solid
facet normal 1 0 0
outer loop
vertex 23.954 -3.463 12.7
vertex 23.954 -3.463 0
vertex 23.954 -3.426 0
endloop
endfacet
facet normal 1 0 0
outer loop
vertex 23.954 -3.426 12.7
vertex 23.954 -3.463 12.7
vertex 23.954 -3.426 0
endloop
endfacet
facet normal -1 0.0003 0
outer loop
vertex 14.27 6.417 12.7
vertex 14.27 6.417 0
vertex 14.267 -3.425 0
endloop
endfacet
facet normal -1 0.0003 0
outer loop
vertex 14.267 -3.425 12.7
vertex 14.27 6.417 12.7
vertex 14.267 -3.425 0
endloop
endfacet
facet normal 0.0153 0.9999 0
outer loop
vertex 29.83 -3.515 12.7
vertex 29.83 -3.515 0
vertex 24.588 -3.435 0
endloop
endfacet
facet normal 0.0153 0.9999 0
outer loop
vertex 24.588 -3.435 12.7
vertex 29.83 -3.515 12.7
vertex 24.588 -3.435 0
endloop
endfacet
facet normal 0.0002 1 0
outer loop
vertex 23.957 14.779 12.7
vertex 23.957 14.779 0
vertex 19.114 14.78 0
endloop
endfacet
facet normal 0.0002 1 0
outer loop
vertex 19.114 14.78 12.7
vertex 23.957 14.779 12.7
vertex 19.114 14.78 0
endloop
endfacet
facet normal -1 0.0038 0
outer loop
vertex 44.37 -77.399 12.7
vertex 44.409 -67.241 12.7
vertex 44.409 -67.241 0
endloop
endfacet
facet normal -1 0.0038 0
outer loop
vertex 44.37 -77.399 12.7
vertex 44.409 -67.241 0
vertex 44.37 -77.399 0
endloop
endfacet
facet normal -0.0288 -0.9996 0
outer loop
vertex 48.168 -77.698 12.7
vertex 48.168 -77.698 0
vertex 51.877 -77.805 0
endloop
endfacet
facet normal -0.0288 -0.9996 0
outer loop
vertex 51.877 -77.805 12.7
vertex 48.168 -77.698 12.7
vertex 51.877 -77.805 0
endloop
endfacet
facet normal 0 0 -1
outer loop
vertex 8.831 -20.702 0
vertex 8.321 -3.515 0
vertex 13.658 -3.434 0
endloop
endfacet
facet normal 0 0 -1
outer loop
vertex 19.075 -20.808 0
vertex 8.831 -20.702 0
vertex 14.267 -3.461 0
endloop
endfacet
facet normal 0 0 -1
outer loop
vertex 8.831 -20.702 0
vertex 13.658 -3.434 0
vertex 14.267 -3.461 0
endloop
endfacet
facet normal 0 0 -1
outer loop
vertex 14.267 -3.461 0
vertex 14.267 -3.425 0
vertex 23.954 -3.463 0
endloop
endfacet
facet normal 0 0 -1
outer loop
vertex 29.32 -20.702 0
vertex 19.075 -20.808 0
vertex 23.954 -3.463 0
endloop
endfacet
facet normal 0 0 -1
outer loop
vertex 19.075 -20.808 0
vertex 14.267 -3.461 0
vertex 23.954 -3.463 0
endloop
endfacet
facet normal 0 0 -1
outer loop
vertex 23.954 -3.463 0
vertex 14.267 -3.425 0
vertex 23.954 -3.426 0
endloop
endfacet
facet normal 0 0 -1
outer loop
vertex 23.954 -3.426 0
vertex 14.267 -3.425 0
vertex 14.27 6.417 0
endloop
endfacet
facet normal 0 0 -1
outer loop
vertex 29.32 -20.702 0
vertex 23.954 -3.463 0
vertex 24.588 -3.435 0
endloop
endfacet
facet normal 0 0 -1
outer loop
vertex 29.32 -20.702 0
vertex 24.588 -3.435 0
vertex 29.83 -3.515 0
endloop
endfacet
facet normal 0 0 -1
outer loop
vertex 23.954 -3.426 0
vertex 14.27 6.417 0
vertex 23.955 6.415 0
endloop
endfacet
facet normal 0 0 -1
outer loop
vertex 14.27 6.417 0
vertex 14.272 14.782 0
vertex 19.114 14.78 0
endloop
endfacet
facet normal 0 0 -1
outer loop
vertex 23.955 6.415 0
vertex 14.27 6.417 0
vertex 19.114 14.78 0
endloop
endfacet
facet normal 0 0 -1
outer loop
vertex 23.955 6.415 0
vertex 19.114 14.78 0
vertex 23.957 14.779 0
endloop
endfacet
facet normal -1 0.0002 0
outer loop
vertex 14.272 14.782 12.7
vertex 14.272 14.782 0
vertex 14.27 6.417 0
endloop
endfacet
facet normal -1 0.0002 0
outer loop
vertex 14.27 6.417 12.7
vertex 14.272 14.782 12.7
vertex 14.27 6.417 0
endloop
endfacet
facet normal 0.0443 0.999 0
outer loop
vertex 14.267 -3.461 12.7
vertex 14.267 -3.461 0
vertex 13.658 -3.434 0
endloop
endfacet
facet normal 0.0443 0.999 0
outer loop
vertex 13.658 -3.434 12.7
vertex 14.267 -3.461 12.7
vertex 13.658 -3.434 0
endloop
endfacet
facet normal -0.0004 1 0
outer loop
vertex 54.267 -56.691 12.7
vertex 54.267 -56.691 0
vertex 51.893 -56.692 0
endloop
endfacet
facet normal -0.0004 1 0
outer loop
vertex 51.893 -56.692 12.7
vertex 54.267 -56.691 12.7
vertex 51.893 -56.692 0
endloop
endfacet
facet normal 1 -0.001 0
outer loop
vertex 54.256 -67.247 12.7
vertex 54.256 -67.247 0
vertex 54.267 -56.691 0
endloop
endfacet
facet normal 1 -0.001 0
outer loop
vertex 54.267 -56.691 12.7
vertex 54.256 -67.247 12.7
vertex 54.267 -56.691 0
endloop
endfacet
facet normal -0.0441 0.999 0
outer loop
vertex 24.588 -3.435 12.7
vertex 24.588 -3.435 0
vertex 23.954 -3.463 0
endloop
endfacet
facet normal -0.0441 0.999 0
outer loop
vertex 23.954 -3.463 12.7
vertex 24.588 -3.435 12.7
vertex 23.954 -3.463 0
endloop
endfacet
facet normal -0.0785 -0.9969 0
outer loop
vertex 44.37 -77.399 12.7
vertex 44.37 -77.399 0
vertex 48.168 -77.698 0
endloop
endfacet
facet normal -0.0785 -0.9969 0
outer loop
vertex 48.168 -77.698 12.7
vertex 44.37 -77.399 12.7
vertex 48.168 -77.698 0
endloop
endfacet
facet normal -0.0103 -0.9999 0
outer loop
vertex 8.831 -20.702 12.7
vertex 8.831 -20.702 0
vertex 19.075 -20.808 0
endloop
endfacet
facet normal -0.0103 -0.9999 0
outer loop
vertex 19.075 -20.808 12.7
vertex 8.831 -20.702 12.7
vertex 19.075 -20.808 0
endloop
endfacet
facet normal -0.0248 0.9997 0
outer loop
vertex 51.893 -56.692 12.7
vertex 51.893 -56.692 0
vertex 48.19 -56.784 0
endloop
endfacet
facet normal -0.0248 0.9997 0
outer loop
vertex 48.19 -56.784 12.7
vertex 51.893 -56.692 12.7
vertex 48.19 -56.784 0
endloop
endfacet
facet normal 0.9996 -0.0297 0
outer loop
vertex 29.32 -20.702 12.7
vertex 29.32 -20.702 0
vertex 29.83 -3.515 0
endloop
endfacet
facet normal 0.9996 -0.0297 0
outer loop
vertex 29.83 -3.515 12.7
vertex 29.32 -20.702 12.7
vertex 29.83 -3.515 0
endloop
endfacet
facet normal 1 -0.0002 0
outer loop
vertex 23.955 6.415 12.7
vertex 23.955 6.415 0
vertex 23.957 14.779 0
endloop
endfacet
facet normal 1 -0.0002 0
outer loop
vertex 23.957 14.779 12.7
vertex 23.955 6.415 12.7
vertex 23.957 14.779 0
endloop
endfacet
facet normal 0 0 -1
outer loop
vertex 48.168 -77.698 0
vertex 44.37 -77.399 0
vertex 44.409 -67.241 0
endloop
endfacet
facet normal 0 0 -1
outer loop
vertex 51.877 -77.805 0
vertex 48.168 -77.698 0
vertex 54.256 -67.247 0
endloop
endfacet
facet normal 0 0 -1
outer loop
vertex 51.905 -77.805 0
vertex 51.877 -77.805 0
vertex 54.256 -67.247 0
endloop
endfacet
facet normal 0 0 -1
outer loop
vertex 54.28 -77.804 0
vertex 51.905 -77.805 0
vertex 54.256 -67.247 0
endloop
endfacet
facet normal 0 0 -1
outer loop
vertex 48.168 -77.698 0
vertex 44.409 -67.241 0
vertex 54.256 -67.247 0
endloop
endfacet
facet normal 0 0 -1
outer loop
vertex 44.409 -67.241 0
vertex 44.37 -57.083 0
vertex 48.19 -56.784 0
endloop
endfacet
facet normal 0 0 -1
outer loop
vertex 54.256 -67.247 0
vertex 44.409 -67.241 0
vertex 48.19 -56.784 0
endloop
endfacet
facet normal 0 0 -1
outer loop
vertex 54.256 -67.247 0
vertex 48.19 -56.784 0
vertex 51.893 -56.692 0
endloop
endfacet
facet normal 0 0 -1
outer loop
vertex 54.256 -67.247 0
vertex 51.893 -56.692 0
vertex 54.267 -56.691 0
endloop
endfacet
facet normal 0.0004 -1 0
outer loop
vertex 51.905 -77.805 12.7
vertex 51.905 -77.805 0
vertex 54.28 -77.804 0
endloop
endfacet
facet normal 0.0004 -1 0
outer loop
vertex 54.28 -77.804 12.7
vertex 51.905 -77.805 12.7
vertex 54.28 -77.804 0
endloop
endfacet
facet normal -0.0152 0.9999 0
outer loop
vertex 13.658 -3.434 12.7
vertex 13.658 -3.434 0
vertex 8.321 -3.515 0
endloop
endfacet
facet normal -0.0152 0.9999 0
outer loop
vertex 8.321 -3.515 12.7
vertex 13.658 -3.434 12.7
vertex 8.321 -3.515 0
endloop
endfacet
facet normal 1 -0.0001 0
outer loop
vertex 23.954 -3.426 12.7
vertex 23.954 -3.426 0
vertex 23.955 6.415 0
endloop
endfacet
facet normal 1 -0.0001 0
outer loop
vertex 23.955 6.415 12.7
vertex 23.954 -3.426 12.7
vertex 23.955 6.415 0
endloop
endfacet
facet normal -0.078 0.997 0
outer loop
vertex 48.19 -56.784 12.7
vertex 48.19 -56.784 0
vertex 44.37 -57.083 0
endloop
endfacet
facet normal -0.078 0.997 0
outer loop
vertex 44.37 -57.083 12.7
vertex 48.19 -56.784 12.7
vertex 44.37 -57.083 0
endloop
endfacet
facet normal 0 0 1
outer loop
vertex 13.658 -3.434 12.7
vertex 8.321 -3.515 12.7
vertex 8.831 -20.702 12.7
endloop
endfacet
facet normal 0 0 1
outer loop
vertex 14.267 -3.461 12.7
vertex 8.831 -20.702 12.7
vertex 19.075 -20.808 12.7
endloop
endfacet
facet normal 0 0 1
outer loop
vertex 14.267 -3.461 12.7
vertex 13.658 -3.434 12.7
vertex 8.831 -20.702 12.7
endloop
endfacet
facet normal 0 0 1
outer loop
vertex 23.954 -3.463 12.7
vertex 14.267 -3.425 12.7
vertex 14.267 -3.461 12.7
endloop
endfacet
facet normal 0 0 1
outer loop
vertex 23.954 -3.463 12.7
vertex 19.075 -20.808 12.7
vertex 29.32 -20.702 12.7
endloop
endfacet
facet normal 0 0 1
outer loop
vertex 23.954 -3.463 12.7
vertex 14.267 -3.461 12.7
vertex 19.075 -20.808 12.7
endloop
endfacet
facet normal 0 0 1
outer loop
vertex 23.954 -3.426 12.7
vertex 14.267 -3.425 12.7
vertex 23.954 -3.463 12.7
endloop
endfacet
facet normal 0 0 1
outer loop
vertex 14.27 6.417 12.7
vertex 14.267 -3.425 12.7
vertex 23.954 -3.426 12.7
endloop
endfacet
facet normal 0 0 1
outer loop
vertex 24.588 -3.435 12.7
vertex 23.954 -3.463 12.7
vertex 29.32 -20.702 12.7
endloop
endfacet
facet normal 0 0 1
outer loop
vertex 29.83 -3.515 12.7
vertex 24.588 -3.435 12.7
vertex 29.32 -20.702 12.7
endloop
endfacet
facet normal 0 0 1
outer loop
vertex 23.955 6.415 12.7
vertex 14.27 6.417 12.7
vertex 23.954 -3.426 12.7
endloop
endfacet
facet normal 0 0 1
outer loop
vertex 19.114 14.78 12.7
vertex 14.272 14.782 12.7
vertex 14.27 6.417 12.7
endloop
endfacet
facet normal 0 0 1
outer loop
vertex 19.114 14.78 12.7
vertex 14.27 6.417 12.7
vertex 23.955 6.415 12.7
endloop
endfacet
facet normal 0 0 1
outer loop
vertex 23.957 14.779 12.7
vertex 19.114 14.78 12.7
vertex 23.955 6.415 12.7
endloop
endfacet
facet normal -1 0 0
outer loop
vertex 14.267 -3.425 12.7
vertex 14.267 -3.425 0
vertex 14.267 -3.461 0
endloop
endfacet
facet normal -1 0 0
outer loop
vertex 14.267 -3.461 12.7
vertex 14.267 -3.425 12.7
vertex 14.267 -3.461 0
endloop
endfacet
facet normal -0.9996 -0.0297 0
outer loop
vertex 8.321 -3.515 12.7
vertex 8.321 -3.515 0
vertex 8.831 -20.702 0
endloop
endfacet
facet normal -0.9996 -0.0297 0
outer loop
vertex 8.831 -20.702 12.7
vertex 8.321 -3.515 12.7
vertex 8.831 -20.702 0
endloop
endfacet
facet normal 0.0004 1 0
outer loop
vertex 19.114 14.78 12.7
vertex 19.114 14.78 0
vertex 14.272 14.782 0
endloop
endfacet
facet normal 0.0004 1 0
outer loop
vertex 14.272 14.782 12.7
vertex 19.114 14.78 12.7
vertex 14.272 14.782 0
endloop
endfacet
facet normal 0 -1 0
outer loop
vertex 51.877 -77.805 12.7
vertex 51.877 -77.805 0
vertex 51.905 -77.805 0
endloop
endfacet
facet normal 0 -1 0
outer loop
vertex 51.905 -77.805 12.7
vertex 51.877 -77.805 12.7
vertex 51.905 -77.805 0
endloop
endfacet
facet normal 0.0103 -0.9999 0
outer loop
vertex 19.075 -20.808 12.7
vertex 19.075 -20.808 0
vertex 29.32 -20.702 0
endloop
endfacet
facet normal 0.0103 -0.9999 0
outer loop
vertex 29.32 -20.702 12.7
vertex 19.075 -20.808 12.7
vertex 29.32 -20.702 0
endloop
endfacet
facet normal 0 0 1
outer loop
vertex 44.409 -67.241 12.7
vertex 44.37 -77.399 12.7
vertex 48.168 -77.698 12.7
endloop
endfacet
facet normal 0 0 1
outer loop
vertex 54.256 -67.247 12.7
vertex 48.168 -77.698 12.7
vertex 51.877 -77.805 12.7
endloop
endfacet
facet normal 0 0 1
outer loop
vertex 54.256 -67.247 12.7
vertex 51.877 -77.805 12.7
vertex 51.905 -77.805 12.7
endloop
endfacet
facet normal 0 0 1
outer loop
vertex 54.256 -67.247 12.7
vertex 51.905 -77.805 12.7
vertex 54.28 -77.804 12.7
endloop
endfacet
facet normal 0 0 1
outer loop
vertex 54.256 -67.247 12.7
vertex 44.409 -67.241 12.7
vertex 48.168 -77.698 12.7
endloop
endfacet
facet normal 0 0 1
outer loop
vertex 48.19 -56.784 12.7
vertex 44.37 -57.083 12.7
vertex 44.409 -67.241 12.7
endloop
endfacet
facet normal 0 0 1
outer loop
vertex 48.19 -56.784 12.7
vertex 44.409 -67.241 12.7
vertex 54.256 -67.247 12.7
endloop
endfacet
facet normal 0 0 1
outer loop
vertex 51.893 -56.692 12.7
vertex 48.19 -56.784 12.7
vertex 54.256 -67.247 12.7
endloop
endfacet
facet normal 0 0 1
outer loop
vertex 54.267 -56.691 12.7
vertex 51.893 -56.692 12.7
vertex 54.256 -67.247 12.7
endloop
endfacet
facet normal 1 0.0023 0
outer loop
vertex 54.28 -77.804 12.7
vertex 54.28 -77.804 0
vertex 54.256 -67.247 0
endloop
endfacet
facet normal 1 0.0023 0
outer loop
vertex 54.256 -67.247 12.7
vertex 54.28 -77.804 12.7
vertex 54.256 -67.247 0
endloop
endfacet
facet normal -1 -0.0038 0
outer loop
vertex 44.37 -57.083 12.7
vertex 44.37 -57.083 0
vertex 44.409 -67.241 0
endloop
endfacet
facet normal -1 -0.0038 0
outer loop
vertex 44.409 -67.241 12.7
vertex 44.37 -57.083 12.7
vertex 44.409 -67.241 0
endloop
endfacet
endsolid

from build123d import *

# Parameters (mm, degrees)
F1_DEPTH = 12.7
F2_DEPTH = 12.7
F3_DEPTH = 12.7


# Not quite as in the source:
# - ends of sketch curves that miss each other by under 0.0002 mm in the source are joined


with BuildPart() as f1:
    # F0 (on Top) → F1 (new body)
    with BuildSketch(Plane.XY):
        Polygon((48.1904364, -56.783518093), (44.3699114476, -57.0827370893), (44.4090344471, -67.2408419628), (44.3699114476, -77.3989428363), (48.1680944003, -77.6981328326), (51.8766943541, -77.8051478313), (51.9053793534, -77.8051322055), (54.2796933242, -77.8038388313), (54.2560783245, -67.2473299627), (54.2674333243, -56.6907980942), (51.8931293539, -56.6922220942), align=None)
    extrude(amount=F1_DEPTH)


with BuildPart() as f2:
    # F0 (on Top) → F2 (new body)
    with BuildSketch(Plane.XY):
        Polygon((19.0754927625, -3.3519267583), (14.2665940583, -3.4246807871), (14.2665828224, -3.4606557569), (13.6578667858, -3.4338902474), (8.3214078964, -3.5146257562), (8.83126389, -20.7016265423), (19.0754967625, -20.8079195409), (29.319728635, -20.7016265423), (29.8295716286, -3.5146237562), (24.5883054068, -3.4353293517), (23.9535827018, -3.4629397569), (23.9535885865, -3.4257268072), align=None)
    extrude(amount=F2_DEPTH)

    # F0 (on Top) → F3 (join)
    with BuildSketch(Plane.XY):
        Polygon((14.2716398223, 14.781595016), (14.2696678223, 6.4168211201), (14.2665940583, -3.4246807871), (19.0754927625, -3.3519267583), (23.9535885865, -3.4257268072), (23.9551447017, 6.4145411201), (23.9571087017, 14.779316016), (19.114378762, 14.780459016), align=None)
    extrude(amount=F3_DEPTH)


solid = Compound([f1.part, f2.part])
